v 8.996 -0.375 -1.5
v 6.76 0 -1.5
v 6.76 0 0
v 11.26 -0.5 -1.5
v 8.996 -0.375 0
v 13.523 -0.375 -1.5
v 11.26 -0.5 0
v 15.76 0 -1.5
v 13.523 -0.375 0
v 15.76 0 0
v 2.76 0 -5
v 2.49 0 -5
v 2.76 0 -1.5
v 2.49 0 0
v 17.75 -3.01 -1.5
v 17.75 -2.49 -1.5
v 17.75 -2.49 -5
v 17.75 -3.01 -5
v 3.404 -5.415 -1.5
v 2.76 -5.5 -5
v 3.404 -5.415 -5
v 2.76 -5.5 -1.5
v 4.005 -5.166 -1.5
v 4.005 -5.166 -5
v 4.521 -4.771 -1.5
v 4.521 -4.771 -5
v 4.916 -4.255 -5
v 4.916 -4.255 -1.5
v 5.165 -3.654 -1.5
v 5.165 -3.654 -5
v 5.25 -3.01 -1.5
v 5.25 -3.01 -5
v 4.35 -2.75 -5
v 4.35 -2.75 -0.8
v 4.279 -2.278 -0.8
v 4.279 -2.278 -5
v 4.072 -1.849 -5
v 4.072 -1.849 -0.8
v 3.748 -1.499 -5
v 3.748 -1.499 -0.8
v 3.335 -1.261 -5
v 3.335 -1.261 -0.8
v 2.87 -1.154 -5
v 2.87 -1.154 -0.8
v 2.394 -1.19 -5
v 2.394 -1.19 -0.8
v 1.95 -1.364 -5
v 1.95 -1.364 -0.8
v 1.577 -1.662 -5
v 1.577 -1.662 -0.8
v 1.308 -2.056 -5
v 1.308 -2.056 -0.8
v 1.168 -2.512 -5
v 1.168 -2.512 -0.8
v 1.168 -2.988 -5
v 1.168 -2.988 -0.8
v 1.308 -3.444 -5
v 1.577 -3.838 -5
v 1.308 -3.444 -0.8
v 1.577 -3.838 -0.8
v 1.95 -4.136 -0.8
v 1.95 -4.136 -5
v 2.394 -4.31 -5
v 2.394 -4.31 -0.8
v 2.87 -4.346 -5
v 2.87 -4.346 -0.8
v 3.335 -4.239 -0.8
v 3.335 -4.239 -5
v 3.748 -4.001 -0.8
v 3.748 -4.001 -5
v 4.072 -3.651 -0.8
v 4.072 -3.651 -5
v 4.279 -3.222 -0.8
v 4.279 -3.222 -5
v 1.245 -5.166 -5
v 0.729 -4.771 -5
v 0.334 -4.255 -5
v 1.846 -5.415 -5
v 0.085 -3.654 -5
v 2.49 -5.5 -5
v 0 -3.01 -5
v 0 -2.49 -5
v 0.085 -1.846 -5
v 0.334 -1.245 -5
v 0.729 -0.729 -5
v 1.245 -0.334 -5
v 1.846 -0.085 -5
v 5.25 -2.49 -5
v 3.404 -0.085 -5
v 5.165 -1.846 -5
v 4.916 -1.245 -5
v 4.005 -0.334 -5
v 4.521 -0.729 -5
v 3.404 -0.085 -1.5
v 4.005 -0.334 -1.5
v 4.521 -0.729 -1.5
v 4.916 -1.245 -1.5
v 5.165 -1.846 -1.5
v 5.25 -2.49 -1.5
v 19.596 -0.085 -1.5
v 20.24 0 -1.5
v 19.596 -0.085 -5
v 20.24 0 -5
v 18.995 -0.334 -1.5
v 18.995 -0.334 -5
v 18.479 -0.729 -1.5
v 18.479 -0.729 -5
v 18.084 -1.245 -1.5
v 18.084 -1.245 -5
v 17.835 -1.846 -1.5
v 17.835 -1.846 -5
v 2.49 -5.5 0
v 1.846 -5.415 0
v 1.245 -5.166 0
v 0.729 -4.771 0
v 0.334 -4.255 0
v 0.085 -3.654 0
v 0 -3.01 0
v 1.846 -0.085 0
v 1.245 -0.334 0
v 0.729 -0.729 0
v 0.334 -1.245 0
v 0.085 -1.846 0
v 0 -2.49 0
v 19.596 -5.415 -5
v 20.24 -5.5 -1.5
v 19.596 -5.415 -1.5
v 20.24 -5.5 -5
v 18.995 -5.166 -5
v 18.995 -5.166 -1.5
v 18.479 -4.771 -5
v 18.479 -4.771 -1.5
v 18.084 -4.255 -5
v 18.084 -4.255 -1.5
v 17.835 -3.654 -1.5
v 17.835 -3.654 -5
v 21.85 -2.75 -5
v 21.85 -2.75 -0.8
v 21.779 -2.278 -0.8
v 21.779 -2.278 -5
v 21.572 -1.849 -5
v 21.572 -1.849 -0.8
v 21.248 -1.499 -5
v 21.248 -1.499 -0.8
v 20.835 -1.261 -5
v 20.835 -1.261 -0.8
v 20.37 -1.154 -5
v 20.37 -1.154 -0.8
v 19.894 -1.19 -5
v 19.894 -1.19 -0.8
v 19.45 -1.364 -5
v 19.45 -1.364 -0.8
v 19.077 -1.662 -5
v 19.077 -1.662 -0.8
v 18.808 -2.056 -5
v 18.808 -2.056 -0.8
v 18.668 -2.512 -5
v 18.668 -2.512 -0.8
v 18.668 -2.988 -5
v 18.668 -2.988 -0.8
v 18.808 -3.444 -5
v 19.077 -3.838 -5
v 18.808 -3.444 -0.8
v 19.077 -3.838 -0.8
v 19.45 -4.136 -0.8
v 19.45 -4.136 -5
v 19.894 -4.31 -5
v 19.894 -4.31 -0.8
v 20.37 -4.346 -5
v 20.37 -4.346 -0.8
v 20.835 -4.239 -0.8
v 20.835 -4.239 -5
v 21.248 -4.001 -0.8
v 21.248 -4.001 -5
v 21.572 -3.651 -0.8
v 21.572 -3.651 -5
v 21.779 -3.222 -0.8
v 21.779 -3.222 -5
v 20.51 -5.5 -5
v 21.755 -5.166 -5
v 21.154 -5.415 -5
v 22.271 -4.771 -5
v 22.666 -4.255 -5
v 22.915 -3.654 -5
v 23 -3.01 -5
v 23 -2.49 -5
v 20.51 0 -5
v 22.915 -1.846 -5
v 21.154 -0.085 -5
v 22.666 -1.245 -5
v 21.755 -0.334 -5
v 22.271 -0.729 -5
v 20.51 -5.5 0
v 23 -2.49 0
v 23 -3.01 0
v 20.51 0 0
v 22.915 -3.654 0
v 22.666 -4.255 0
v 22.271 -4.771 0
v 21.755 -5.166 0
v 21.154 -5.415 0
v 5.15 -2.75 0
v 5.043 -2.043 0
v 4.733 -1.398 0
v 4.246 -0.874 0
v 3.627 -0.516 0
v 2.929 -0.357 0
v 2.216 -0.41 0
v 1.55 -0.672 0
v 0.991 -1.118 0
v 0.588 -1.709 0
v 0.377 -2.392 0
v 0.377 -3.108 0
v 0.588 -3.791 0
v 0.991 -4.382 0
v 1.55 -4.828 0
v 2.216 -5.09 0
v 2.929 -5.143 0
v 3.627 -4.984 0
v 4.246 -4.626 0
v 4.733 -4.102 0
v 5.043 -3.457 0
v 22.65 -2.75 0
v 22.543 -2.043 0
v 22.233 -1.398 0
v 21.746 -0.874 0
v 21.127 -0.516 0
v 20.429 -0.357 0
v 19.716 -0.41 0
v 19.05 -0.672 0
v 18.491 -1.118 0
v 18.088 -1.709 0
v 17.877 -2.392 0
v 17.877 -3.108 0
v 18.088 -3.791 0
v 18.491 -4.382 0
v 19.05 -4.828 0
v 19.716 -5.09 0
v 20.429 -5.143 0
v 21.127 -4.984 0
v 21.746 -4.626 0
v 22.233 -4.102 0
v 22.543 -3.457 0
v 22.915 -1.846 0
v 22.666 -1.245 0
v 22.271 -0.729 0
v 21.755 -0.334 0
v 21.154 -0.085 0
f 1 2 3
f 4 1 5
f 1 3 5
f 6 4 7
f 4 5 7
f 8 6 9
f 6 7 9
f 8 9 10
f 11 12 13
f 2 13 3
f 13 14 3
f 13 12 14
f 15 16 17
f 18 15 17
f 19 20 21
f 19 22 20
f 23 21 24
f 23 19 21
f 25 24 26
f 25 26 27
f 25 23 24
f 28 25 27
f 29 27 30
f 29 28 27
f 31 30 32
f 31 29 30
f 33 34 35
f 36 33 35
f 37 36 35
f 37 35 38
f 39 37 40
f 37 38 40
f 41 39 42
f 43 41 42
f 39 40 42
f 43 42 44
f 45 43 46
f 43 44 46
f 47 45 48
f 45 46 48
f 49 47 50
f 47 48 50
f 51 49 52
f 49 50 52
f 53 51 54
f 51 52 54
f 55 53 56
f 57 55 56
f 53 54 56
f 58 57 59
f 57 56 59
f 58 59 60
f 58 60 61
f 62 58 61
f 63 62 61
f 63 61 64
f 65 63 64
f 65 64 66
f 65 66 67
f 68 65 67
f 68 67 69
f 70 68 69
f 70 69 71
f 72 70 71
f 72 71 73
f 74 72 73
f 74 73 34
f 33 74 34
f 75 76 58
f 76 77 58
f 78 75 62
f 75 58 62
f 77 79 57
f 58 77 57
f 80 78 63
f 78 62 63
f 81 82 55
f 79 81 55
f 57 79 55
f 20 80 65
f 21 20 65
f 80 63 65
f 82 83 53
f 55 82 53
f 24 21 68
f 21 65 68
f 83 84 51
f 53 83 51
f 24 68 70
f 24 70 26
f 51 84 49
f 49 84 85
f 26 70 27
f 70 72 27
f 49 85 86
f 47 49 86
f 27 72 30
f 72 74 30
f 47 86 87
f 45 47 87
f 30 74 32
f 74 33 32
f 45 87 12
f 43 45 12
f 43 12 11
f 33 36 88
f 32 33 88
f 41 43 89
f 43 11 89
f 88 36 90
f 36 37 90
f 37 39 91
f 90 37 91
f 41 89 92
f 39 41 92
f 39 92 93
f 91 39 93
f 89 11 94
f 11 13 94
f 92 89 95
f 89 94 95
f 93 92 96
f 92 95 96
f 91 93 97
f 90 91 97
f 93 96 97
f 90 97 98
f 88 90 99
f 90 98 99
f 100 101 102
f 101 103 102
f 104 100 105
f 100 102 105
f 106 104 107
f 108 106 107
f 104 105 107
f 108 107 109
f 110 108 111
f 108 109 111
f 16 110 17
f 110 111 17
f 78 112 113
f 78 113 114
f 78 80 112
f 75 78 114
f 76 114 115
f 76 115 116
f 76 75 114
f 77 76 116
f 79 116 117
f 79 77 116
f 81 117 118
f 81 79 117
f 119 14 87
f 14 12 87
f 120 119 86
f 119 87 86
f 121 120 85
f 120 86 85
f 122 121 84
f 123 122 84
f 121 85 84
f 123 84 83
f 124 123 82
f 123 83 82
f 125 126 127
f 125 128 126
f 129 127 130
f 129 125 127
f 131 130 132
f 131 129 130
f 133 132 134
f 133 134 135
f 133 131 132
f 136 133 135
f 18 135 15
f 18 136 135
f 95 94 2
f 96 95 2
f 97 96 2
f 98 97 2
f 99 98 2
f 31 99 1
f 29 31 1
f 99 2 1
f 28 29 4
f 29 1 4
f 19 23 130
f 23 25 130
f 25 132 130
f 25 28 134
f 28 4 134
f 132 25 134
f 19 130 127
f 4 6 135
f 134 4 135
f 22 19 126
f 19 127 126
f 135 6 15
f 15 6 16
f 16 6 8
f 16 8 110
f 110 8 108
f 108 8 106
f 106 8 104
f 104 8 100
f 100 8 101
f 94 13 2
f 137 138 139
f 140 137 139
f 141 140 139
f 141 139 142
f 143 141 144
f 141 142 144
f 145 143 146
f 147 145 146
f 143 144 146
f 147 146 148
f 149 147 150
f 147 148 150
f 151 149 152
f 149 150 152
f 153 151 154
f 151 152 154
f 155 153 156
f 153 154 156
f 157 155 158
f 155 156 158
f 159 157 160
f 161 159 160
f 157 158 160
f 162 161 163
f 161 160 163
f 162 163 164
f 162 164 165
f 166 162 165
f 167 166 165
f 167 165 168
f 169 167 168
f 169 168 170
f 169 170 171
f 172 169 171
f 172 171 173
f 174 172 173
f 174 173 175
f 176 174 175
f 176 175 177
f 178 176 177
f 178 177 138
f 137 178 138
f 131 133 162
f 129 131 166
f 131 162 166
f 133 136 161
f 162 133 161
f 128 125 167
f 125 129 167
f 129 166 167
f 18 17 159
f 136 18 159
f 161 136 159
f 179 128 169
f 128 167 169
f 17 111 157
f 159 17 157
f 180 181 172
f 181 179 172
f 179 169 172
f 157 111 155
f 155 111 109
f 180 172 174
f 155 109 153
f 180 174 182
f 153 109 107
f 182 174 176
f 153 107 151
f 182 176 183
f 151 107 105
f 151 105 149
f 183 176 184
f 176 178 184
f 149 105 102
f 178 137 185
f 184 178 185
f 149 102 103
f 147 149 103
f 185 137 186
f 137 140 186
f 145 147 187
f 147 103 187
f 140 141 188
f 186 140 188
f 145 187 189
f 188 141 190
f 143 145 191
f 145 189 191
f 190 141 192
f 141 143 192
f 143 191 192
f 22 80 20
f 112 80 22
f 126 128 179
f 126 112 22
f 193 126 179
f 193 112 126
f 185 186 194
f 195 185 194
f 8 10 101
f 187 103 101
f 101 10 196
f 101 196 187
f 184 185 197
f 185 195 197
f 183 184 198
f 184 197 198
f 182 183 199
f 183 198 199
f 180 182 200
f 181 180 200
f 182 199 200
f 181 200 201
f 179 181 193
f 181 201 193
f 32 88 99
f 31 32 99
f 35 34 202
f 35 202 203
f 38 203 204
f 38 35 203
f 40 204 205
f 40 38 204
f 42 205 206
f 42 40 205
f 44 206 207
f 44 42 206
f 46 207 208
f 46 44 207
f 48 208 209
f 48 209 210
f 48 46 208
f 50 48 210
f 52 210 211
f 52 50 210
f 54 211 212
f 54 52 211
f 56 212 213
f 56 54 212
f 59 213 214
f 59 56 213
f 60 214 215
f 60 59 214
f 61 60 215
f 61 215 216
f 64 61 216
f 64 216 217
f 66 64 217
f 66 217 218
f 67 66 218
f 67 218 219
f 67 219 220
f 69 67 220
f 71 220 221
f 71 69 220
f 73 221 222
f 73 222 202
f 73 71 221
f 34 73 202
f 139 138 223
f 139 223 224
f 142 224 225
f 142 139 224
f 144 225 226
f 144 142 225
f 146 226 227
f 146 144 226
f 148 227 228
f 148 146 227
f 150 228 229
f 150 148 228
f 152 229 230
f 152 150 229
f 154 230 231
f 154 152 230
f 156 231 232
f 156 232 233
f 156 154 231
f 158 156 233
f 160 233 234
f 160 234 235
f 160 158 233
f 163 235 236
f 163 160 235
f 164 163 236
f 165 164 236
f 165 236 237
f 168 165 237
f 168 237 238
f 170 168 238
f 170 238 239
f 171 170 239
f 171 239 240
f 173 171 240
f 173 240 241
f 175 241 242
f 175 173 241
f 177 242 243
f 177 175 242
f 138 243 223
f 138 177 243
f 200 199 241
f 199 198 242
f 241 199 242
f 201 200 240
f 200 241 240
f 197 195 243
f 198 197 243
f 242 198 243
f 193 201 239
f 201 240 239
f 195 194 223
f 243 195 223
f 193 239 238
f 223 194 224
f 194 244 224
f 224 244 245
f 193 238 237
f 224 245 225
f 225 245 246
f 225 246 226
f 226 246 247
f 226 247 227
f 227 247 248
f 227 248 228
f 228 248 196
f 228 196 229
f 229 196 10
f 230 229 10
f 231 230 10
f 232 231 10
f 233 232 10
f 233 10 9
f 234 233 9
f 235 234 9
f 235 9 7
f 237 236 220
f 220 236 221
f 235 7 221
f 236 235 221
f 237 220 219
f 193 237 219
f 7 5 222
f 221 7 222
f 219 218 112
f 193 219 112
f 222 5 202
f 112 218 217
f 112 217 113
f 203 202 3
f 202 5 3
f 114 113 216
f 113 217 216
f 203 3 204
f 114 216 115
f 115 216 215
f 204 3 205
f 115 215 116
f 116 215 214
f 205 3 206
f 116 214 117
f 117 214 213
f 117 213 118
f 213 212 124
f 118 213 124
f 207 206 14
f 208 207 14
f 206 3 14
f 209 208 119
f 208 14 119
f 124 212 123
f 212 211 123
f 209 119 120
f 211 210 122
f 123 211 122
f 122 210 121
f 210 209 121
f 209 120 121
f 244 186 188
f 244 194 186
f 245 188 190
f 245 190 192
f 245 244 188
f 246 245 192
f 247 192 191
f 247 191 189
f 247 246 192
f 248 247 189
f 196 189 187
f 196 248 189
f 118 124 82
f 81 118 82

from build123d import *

# Parameters (mm, degrees)
PAD_DEPTH       = 5.5
SKETCH001_R     = 1.6
POCKET_DEPTH    = 10
CHAMFER_SIZE    = 0.8
FILLET_R        = 2.49
SKETCH002_R     = 20.5
POCKET001_DEPTH = 2.5


with BuildPart() as part:
    # Sketch → Pad (new body)
    with BuildSketch(Plane.XZ):
        Polygon((0, 0), (0, -5), (5.25, -5), (5.25, -1.5), (17.75, -1.5), (17.75, -5), (23, -5), (23, 0), align=None)
    extrude(amount=PAD_DEPTH)

    # Sketch001 → Pocket (cut)
    with BuildSketch(Plane.XY):
        with Locations((2.75, -2.75)):
            Circle(SKETCH001_R)
        with Locations((20.25, -2.75)):
            Circle(SKETCH001_R)
    extrude(amount=-POCKET_DEPTH, mode=Mode.SUBTRACT)

    # Chamfer
    chamfer_edges = [part.edges().sort_by_distance(p)[0] for p in [
        (1.15, -2.75, 0),
        (18.65, -2.75, 0),
    ]]
    chamfer(chamfer_edges, length=CHAMFER_SIZE)

    # Fillet
    fillet_edges = [part.edges().sort_by_distance(p)[0] for p in [
        (0, -5.5, -2.5),
        (0, 0, -2.5),
        (23, 0, -2.5),
        (23, -5.5, -2.5),
        (5.25, -5.5, -3.25),
        (5.25, 0, -3.25),
        (17.75, -5.5, -3.25),
        (17.75, 0, -3.25),
    ]]
    fillet(fillet_edges, radius=FILLET_R)

    # Sketch002 → Pocket001 (cut)
    with BuildSketch(Plane.XY):
        with Locations((11.259596, 20)):
            Circle(SKETCH002_R)
    extrude(amount=-POCKET001_DEPTH, mode=Mode.SUBTRACT)


solid = part.part
